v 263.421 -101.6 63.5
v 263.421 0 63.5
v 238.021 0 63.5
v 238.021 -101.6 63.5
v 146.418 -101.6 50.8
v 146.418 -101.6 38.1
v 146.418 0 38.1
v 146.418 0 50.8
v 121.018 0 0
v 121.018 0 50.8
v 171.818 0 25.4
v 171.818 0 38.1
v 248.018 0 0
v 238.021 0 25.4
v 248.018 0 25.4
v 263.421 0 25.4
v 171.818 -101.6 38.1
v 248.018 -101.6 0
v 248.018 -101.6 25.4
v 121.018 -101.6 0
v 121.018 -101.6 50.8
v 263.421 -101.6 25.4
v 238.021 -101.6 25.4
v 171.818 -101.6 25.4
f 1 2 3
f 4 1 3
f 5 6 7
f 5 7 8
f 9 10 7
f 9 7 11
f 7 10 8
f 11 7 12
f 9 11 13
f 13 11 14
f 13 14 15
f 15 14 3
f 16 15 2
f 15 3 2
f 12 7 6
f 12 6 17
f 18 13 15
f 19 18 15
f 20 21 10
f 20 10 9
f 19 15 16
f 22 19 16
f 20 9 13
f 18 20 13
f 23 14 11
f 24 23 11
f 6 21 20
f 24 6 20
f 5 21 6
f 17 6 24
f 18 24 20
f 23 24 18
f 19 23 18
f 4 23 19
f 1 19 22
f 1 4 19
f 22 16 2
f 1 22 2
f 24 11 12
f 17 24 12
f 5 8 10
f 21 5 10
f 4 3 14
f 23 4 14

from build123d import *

# Parameters (mm, degrees)
F0_W     = 25.4
F0_H     = 12.7
F1_DEPTH = 101.6
F2_DEPTH = 25.4


with BuildPart() as f1:
    # F0 (on Front) → F1 (new body)
    with BuildSketch(Plane.XZ):
        Polygon((121.018117, 50.8), (121.018117, 0), (248.018117, 0), (248.018117, 25.4), (263.420549, 25.4), (263.420549, 63.5), (238.020549, 63.5), (238.020549, 25.4), (216.686985, 25.4), (181.552551, 25.4), (171.818117, 25.4), (146.418117, 25.4), (146.418117, 38.1), (146.418117, 50.8), align=None)
        with Locations((159.118117, 31.75)):
            Rectangle(F0_W, F0_H)
    extrude(amount=F1_DEPTH)

    # F0 (on Front) → F2 (join)
    with BuildSketch(Plane.XZ):
        Polygon((121.018117, 50.8), (121.018117, 0), (248.018117, 0), (248.018117, 25.4), (263.420549, 25.4), (263.420549, 63.5), (238.020549, 63.5), (238.020549, 25.4), (216.686985, 25.4), (181.552551, 25.4), (171.818117, 25.4), (146.418117, 25.4), (146.418117, 38.1), (146.418117, 50.8), align=None)
        with Locations((159.118117, 31.75)):
            Rectangle(F0_W, F0_H)
    extrude(amount=F2_DEPTH)


solid = f1.part
